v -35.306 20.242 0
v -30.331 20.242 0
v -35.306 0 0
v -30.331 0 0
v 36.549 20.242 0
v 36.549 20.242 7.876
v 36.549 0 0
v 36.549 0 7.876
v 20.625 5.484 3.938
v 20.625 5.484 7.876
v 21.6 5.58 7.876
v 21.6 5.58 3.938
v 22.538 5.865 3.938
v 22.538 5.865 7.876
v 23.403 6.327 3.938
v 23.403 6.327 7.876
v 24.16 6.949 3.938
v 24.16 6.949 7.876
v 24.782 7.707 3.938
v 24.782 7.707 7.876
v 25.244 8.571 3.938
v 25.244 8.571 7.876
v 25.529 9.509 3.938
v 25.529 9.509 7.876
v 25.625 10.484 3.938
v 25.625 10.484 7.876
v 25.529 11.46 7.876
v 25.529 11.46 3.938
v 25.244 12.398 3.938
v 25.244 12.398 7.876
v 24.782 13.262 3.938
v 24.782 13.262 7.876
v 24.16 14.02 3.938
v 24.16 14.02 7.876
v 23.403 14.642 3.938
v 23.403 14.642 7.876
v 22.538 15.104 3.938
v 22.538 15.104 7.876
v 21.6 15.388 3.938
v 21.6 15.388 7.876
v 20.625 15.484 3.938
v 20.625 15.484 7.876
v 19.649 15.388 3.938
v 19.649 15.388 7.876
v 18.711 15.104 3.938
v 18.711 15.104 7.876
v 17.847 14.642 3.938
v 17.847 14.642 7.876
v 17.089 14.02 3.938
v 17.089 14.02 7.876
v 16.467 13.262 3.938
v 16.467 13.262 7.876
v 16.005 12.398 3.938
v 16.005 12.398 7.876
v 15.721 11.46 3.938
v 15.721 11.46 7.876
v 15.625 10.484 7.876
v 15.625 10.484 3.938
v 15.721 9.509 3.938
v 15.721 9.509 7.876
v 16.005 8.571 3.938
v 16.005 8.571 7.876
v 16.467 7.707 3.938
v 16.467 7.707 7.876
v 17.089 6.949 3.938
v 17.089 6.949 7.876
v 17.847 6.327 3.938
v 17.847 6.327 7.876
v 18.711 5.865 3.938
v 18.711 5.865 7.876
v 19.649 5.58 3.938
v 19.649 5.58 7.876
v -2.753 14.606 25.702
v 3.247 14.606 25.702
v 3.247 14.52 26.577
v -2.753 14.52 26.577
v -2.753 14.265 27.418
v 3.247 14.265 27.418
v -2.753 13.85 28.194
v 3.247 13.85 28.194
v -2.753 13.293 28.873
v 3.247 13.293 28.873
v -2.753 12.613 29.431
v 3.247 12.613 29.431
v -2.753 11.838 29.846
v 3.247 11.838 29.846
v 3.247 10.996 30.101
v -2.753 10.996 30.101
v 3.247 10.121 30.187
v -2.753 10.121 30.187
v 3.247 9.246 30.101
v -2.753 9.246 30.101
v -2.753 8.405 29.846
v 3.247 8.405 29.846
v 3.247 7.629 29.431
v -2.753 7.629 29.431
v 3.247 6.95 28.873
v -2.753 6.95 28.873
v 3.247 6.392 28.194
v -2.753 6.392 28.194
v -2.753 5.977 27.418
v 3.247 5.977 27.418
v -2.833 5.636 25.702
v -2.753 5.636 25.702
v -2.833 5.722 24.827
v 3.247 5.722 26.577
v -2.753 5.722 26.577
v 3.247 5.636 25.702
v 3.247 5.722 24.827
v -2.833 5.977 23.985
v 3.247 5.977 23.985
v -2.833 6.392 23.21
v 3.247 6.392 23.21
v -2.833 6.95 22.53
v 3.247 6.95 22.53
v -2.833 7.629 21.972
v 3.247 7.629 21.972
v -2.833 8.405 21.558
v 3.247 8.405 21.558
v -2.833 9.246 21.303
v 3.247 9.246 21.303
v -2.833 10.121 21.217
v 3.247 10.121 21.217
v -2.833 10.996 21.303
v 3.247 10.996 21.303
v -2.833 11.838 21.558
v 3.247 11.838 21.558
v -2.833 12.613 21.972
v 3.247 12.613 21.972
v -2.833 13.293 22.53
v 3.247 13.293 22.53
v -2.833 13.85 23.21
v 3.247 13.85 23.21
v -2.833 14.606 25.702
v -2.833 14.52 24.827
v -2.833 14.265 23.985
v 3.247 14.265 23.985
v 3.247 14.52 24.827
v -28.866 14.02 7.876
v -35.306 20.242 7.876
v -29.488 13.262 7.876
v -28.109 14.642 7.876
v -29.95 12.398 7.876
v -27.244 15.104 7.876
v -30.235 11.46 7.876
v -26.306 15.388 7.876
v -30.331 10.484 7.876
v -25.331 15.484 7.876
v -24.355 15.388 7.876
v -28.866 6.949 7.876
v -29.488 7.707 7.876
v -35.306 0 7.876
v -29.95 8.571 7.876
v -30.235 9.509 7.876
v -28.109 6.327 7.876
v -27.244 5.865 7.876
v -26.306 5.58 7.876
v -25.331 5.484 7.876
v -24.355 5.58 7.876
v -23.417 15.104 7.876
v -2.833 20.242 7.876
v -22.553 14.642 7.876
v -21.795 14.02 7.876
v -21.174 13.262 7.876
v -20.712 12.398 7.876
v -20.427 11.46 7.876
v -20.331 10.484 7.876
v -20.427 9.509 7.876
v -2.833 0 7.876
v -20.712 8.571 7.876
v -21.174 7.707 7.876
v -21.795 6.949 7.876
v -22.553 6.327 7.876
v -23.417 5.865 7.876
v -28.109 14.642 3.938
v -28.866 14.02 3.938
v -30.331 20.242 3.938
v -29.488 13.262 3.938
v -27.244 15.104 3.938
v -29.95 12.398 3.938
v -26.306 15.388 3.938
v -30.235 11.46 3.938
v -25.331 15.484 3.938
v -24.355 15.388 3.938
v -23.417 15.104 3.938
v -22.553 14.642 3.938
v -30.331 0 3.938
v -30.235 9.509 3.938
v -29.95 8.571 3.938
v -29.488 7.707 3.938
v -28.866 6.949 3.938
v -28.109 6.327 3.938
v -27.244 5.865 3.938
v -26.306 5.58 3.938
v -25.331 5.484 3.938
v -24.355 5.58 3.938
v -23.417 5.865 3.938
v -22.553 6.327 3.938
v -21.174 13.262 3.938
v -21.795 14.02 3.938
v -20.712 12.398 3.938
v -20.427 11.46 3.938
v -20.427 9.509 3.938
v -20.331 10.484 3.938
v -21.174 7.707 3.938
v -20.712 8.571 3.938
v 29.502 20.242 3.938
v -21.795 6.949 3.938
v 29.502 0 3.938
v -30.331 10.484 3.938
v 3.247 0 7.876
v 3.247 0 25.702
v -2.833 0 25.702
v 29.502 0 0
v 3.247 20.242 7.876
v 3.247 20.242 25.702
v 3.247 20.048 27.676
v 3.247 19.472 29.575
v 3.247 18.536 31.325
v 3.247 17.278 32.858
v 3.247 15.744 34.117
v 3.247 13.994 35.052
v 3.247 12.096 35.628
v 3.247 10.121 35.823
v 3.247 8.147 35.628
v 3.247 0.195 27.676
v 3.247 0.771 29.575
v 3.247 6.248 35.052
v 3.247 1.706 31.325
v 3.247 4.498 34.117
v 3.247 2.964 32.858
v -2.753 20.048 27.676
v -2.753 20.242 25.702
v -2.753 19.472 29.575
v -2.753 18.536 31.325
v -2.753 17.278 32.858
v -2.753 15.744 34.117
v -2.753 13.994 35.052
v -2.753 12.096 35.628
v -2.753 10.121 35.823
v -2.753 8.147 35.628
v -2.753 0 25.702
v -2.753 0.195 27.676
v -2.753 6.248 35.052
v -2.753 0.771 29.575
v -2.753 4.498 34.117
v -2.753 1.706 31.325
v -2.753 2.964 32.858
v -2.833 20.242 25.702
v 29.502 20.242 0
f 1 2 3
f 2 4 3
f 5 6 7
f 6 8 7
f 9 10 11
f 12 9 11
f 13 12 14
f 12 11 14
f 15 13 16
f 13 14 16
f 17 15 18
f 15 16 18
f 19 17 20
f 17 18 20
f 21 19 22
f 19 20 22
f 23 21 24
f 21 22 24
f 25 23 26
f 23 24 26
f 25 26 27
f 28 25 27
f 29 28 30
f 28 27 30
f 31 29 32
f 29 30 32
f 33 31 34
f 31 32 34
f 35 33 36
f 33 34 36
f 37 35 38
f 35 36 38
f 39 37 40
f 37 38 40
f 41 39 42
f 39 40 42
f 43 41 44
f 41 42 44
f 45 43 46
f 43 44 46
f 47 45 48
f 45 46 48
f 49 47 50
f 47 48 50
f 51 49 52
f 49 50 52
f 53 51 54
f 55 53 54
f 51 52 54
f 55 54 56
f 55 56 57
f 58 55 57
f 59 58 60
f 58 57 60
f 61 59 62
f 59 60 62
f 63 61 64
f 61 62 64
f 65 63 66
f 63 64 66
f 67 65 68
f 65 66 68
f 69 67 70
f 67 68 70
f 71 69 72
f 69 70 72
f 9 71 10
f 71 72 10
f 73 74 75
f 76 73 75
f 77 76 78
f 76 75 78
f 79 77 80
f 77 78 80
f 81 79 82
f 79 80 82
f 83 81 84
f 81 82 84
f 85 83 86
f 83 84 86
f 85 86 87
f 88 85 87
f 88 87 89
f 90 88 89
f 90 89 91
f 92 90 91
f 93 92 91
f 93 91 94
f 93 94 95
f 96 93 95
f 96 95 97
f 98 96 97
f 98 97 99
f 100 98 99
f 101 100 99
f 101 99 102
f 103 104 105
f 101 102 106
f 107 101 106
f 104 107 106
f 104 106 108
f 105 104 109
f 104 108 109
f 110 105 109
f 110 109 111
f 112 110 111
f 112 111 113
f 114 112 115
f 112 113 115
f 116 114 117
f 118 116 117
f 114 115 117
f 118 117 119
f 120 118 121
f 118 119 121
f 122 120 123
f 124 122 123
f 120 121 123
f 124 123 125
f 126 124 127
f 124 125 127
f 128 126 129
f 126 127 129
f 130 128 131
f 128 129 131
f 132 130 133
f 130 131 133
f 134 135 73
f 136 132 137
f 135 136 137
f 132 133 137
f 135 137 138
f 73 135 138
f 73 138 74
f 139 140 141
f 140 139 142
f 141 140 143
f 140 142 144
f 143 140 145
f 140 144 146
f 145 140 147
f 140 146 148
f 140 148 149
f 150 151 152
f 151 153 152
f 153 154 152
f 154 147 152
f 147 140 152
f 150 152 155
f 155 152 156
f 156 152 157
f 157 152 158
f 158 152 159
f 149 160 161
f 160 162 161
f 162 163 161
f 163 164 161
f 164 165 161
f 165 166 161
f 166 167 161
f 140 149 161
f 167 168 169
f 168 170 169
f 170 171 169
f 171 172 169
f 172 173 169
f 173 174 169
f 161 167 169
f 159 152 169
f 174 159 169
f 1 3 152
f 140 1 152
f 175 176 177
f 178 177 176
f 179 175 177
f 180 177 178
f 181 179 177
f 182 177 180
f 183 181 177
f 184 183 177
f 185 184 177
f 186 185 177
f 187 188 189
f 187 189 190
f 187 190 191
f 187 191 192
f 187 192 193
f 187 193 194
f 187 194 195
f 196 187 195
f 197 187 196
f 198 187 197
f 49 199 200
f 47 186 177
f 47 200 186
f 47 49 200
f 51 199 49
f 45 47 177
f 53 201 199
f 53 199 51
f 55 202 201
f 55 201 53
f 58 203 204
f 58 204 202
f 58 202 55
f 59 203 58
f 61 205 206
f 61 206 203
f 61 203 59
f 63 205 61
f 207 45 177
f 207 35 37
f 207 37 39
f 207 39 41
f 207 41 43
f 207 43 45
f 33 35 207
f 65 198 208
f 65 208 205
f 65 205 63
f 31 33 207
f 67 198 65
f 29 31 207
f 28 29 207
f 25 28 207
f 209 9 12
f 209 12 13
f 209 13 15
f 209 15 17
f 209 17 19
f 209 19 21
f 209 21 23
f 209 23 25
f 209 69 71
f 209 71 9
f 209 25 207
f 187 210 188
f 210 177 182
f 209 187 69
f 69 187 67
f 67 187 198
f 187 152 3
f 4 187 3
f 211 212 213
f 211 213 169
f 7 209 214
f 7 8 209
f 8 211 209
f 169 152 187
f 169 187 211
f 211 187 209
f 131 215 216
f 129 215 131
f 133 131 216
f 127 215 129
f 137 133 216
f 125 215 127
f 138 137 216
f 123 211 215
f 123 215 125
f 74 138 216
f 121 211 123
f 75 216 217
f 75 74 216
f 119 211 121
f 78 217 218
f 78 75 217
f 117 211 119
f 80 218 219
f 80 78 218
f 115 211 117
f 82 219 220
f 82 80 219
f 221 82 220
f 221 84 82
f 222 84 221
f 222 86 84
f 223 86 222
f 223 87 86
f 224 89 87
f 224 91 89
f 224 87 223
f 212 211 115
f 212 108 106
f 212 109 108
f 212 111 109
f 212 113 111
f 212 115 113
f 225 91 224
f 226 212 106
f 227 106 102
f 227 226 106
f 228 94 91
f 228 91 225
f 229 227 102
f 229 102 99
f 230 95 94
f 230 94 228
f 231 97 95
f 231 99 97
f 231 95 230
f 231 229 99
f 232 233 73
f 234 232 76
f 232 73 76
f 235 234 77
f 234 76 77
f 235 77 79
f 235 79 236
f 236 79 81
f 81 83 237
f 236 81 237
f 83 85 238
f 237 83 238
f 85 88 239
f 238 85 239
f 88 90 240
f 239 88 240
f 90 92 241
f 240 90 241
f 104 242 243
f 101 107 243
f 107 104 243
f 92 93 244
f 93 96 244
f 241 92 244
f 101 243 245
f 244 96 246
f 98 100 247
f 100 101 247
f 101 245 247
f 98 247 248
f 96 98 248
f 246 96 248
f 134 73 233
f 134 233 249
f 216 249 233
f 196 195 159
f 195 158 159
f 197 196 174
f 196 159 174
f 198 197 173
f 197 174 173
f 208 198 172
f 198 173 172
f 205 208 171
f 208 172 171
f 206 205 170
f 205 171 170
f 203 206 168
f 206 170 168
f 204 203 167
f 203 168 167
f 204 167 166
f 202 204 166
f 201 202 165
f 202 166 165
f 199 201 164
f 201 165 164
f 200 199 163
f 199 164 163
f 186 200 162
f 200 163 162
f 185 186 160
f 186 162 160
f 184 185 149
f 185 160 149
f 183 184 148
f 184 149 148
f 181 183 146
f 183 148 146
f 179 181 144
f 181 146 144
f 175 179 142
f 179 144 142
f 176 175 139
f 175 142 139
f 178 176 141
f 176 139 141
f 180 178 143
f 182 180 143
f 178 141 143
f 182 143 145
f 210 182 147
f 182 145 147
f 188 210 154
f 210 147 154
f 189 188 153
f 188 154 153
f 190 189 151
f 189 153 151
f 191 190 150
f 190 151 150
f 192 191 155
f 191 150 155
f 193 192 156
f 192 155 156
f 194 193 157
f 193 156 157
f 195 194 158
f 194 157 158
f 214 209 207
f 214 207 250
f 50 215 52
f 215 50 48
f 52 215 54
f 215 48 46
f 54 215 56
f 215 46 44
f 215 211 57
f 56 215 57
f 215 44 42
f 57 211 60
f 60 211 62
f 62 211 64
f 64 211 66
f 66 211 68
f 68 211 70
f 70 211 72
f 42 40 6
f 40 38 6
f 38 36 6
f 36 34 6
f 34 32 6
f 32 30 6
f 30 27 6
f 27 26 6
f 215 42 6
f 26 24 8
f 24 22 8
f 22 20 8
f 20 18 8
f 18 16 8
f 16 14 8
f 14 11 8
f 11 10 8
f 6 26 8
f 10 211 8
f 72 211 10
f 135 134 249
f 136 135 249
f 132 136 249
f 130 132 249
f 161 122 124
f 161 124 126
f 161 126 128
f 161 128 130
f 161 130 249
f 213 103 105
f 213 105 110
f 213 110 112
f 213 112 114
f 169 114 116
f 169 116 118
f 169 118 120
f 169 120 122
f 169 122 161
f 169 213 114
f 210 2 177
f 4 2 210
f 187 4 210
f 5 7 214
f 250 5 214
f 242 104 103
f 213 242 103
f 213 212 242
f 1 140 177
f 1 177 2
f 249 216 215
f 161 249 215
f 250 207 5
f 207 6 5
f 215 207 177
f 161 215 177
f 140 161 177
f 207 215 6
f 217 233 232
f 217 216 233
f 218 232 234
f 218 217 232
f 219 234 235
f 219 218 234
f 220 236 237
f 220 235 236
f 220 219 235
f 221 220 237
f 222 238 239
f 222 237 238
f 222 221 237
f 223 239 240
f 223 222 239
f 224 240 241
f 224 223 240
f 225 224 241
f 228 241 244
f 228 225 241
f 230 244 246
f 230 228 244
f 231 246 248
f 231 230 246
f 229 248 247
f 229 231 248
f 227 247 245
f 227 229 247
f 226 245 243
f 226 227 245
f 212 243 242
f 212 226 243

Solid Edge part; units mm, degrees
sketch "Sketch1" plane through (0, 0, 0) normal (0, -1, 0) x (1, 0, 0)
  line L0 (-2.8327, 25.7018) -> (-2.8327, 7.8764)
  line L1 (-35.3055, 7.8764) -> (-2.8327, 7.8764)
  line L2 (-35.3055, 0) -> (-35.3055, 7.8764)
  line L3 (-30.3309, 0) -> (-35.3055, 0)
  line L4 (-30.3309, 0) -> (-30.3309, 3.9382)
  line L5 (-30.3309, 3.9382) -> (29.5018, 3.9382)
  line L6 (29.5018, 3.9382) -> (29.5018, 0)
  line L7 (36.5491, 0) -> (29.5018, 0)
  line L8 (36.5491, 7.8764) -> (36.5491, 0)
  line L9 (3.2473, 7.8764) -> (36.5491, 7.8764)
  line L10 (3.2473, 7.8764) -> (3.2473, 25.7018)
  line L11 (3.2473, 25.7018) -> (-2.8327, 25.7018)
extrude "Protrusion1" add sketch "Sketch1" against normal blind 20.2422
sketch "Sketch2" plane through (3.2473, 10.1211, 16.7891) normal (1, 0, 0) x (0, 1, 0)
  line L0 (-10.1211, 8.9127) -> (10.1211, 8.9127)
  arc A0 (-10.1211, 8.9127) -> (10.1211, 8.9127) centre (0, 8.9127) cw
extrude "ExtrudedProtrusion_2" add sketch "Sketch2" against normal blind 6
sketch "Sketch3" plane through (3.2473, 10.1211, 21.8496) normal (1, 0, 0) x (0, 1, 0)
  circle A0 centre (0, 3.8522) radius 4.4852
extrude "ExtrudedCutout_1" cut sketch "Sketch3" against normal blind 19.6871
hole "Hole_1" at (20.6248, 10.4844, 7.8764) direction (0, 0, -1) diameter 10 end up to next
hole "Hole1" at (-25.3309, 10.4844, 7.8764) direction (0, 0, -1) diameter 10 end up to next
